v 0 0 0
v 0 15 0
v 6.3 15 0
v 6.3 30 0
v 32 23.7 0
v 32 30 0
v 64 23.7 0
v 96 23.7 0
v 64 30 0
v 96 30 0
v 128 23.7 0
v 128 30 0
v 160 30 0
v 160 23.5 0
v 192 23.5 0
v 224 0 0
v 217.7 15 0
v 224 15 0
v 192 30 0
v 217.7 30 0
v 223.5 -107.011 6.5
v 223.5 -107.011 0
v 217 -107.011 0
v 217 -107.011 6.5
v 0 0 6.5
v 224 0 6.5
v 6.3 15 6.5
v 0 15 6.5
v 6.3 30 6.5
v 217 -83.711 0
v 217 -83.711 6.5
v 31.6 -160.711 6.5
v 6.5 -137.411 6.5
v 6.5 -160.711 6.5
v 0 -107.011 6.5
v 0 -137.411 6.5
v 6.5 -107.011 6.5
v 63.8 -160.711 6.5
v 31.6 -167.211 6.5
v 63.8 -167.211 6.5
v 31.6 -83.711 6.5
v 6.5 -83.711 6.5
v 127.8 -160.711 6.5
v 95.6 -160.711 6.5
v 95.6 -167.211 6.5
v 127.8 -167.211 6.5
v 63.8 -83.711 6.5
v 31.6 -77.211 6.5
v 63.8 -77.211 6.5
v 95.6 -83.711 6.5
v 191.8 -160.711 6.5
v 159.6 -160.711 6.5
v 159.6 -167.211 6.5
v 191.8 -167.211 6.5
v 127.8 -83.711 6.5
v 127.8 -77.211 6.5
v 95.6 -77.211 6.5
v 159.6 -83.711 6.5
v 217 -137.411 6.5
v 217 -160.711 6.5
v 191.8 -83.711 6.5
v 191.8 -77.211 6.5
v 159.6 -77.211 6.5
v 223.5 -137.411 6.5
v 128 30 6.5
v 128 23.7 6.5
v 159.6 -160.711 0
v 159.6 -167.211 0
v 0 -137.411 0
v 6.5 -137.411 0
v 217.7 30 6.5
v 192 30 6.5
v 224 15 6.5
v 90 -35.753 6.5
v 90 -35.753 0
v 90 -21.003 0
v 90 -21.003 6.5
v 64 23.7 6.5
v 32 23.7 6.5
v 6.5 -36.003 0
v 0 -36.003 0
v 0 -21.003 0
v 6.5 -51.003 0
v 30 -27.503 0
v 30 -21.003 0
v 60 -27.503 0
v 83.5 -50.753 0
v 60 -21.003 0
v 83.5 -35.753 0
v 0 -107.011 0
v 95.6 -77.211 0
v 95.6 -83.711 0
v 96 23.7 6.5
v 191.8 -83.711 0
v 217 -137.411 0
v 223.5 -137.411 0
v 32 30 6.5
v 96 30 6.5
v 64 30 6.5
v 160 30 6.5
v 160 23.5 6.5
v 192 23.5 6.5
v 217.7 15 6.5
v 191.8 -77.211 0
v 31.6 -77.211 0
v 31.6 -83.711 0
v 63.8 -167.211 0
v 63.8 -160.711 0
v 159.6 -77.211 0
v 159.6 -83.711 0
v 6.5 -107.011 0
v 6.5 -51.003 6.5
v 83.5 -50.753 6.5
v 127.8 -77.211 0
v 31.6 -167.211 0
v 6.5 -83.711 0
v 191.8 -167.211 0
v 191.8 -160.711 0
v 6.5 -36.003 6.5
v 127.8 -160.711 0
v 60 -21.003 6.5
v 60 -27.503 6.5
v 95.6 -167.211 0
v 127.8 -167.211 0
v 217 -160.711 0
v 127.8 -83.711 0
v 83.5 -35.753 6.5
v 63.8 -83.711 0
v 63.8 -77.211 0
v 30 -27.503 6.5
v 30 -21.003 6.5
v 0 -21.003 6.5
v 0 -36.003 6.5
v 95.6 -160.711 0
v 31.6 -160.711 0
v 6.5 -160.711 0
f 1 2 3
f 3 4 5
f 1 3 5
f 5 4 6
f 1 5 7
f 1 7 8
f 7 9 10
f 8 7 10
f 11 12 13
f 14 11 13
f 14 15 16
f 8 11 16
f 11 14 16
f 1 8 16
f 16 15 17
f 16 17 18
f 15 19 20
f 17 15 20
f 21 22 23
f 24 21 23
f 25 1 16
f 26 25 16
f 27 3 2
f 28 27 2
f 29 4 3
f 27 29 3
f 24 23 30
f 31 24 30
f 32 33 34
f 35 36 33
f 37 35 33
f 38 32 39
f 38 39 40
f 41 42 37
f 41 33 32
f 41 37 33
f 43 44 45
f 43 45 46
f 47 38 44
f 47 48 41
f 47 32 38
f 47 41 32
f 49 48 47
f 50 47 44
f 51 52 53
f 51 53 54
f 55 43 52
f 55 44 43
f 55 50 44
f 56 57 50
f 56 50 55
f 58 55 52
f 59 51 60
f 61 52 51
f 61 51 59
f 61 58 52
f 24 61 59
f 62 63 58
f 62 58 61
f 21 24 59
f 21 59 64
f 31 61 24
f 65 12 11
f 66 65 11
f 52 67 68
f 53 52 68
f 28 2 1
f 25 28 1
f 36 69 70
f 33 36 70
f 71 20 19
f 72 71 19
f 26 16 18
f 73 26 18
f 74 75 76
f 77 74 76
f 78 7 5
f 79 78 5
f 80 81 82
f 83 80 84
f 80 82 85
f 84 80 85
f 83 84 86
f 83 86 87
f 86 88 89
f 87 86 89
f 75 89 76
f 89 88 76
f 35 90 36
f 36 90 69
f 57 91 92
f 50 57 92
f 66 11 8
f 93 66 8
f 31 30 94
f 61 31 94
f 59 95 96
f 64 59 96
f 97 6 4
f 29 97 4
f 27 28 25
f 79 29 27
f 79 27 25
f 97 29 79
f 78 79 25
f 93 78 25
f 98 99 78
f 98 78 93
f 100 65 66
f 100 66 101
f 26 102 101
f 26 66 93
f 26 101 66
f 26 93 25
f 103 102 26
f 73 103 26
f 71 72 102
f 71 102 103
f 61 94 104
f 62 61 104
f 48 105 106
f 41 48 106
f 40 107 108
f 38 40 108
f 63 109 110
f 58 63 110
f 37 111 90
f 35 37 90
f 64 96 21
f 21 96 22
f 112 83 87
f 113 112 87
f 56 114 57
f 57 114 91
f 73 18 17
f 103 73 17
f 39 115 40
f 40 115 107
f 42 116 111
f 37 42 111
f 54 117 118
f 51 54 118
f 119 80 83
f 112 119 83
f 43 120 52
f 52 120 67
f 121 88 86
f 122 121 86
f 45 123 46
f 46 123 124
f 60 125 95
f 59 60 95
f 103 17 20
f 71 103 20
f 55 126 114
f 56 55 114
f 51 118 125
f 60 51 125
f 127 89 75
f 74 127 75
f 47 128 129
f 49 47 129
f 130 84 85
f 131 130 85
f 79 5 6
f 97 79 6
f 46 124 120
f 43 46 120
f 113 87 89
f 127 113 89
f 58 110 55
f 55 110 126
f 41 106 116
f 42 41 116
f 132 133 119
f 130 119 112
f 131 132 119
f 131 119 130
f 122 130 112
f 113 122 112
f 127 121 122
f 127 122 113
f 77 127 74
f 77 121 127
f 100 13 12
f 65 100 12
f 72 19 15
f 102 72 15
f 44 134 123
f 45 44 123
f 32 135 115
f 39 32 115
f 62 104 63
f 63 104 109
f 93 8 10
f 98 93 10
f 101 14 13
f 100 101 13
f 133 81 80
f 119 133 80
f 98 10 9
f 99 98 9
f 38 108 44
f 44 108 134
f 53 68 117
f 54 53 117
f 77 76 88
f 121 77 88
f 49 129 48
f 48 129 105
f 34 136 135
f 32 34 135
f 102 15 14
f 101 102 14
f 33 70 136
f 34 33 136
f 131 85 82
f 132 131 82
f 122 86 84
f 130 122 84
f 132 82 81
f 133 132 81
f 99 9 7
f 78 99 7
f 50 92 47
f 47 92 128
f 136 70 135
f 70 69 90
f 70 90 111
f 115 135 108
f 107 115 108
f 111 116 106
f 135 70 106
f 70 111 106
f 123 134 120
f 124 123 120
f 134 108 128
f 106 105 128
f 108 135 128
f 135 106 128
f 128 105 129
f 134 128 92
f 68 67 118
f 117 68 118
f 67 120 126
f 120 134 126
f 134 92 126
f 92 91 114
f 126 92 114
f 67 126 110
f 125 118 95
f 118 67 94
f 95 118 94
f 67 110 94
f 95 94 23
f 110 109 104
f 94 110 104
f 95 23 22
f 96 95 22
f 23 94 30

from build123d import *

# Parameters (mm, degrees)
F1_DEPTH = 6.5
F3_DEPTH = 6.5
F5_DEPTH = 6.5


with BuildPart() as f1:
    # F0 (on Top) → F1 (new body)
    with BuildSketch(Plane.XY):
        Polygon((32, 23.7), (32, 30), (6.3, 30), (6.3, 15), (0, 15), (0, 0), (224, 0), (224, 15), (217.7, 15), (217.7, 30), (192, 30), (192, 23.5), (160, 23.5), (160, 30), (128, 30), (128, 23.7), (96, 23.7), (96, 30), (64, 30), (64, 23.7), align=None)
    extrude(amount=F1_DEPTH)


with BuildPart() as f3:
    # F2 (on Top) → F3 (new body)
    with BuildSketch(Plane.XY):
        Polygon((30, -21.002606), (0, -21.002606), (0, -36.002606), (6.5, -36.002606), (6.5, -51.002606), (83.499998, -50.752603), (83.499998, -35.752603), (90, -35.752603), (90, -21.002606), (60, -21.002606), (60, -27.502606), (30, -27.502606), align=None)
    extrude(amount=F3_DEPTH)


with BuildPart() as f5:
    # F4 (on Top) → F5 (new body)
    with BuildSketch(Plane.XY):
        Polygon((6.5, -83.711147), (6.5, -107.011147), (0, -107.011147), (0, -137.411147), (6.5, -137.411147), (6.5, -160.711147), (31.6, -160.711147), (31.6, -167.211147), (63.8, -167.211147), (63.8, -160.711147), (95.6, -160.711147), (95.6, -167.211147), (127.8, -167.211147), (127.8, -160.711147), (159.6, -160.711147), (159.6, -167.211147), (191.8, -167.211147), (191.8, -160.711147), (217, -160.711147), (217, -137.411147), (223.5, -137.411147), (223.5, -107.011147), (217, -107.011147), (217, -83.711147), (191.8, -83.711147), (191.8, -77.211147), (159.6, -77.211147), (159.6, -83.711147), (127.8, -83.711147), (127.8, -77.211147), (95.6, -77.211147), (95.6, -83.711147), (63.8, -83.711147), (63.8, -77.211147), (31.6, -77.211147), (31.6, -83.711147), align=None)
    extrude(amount=F5_DEPTH)


solid = Compound([f1.part, f3.part, f5.part])
